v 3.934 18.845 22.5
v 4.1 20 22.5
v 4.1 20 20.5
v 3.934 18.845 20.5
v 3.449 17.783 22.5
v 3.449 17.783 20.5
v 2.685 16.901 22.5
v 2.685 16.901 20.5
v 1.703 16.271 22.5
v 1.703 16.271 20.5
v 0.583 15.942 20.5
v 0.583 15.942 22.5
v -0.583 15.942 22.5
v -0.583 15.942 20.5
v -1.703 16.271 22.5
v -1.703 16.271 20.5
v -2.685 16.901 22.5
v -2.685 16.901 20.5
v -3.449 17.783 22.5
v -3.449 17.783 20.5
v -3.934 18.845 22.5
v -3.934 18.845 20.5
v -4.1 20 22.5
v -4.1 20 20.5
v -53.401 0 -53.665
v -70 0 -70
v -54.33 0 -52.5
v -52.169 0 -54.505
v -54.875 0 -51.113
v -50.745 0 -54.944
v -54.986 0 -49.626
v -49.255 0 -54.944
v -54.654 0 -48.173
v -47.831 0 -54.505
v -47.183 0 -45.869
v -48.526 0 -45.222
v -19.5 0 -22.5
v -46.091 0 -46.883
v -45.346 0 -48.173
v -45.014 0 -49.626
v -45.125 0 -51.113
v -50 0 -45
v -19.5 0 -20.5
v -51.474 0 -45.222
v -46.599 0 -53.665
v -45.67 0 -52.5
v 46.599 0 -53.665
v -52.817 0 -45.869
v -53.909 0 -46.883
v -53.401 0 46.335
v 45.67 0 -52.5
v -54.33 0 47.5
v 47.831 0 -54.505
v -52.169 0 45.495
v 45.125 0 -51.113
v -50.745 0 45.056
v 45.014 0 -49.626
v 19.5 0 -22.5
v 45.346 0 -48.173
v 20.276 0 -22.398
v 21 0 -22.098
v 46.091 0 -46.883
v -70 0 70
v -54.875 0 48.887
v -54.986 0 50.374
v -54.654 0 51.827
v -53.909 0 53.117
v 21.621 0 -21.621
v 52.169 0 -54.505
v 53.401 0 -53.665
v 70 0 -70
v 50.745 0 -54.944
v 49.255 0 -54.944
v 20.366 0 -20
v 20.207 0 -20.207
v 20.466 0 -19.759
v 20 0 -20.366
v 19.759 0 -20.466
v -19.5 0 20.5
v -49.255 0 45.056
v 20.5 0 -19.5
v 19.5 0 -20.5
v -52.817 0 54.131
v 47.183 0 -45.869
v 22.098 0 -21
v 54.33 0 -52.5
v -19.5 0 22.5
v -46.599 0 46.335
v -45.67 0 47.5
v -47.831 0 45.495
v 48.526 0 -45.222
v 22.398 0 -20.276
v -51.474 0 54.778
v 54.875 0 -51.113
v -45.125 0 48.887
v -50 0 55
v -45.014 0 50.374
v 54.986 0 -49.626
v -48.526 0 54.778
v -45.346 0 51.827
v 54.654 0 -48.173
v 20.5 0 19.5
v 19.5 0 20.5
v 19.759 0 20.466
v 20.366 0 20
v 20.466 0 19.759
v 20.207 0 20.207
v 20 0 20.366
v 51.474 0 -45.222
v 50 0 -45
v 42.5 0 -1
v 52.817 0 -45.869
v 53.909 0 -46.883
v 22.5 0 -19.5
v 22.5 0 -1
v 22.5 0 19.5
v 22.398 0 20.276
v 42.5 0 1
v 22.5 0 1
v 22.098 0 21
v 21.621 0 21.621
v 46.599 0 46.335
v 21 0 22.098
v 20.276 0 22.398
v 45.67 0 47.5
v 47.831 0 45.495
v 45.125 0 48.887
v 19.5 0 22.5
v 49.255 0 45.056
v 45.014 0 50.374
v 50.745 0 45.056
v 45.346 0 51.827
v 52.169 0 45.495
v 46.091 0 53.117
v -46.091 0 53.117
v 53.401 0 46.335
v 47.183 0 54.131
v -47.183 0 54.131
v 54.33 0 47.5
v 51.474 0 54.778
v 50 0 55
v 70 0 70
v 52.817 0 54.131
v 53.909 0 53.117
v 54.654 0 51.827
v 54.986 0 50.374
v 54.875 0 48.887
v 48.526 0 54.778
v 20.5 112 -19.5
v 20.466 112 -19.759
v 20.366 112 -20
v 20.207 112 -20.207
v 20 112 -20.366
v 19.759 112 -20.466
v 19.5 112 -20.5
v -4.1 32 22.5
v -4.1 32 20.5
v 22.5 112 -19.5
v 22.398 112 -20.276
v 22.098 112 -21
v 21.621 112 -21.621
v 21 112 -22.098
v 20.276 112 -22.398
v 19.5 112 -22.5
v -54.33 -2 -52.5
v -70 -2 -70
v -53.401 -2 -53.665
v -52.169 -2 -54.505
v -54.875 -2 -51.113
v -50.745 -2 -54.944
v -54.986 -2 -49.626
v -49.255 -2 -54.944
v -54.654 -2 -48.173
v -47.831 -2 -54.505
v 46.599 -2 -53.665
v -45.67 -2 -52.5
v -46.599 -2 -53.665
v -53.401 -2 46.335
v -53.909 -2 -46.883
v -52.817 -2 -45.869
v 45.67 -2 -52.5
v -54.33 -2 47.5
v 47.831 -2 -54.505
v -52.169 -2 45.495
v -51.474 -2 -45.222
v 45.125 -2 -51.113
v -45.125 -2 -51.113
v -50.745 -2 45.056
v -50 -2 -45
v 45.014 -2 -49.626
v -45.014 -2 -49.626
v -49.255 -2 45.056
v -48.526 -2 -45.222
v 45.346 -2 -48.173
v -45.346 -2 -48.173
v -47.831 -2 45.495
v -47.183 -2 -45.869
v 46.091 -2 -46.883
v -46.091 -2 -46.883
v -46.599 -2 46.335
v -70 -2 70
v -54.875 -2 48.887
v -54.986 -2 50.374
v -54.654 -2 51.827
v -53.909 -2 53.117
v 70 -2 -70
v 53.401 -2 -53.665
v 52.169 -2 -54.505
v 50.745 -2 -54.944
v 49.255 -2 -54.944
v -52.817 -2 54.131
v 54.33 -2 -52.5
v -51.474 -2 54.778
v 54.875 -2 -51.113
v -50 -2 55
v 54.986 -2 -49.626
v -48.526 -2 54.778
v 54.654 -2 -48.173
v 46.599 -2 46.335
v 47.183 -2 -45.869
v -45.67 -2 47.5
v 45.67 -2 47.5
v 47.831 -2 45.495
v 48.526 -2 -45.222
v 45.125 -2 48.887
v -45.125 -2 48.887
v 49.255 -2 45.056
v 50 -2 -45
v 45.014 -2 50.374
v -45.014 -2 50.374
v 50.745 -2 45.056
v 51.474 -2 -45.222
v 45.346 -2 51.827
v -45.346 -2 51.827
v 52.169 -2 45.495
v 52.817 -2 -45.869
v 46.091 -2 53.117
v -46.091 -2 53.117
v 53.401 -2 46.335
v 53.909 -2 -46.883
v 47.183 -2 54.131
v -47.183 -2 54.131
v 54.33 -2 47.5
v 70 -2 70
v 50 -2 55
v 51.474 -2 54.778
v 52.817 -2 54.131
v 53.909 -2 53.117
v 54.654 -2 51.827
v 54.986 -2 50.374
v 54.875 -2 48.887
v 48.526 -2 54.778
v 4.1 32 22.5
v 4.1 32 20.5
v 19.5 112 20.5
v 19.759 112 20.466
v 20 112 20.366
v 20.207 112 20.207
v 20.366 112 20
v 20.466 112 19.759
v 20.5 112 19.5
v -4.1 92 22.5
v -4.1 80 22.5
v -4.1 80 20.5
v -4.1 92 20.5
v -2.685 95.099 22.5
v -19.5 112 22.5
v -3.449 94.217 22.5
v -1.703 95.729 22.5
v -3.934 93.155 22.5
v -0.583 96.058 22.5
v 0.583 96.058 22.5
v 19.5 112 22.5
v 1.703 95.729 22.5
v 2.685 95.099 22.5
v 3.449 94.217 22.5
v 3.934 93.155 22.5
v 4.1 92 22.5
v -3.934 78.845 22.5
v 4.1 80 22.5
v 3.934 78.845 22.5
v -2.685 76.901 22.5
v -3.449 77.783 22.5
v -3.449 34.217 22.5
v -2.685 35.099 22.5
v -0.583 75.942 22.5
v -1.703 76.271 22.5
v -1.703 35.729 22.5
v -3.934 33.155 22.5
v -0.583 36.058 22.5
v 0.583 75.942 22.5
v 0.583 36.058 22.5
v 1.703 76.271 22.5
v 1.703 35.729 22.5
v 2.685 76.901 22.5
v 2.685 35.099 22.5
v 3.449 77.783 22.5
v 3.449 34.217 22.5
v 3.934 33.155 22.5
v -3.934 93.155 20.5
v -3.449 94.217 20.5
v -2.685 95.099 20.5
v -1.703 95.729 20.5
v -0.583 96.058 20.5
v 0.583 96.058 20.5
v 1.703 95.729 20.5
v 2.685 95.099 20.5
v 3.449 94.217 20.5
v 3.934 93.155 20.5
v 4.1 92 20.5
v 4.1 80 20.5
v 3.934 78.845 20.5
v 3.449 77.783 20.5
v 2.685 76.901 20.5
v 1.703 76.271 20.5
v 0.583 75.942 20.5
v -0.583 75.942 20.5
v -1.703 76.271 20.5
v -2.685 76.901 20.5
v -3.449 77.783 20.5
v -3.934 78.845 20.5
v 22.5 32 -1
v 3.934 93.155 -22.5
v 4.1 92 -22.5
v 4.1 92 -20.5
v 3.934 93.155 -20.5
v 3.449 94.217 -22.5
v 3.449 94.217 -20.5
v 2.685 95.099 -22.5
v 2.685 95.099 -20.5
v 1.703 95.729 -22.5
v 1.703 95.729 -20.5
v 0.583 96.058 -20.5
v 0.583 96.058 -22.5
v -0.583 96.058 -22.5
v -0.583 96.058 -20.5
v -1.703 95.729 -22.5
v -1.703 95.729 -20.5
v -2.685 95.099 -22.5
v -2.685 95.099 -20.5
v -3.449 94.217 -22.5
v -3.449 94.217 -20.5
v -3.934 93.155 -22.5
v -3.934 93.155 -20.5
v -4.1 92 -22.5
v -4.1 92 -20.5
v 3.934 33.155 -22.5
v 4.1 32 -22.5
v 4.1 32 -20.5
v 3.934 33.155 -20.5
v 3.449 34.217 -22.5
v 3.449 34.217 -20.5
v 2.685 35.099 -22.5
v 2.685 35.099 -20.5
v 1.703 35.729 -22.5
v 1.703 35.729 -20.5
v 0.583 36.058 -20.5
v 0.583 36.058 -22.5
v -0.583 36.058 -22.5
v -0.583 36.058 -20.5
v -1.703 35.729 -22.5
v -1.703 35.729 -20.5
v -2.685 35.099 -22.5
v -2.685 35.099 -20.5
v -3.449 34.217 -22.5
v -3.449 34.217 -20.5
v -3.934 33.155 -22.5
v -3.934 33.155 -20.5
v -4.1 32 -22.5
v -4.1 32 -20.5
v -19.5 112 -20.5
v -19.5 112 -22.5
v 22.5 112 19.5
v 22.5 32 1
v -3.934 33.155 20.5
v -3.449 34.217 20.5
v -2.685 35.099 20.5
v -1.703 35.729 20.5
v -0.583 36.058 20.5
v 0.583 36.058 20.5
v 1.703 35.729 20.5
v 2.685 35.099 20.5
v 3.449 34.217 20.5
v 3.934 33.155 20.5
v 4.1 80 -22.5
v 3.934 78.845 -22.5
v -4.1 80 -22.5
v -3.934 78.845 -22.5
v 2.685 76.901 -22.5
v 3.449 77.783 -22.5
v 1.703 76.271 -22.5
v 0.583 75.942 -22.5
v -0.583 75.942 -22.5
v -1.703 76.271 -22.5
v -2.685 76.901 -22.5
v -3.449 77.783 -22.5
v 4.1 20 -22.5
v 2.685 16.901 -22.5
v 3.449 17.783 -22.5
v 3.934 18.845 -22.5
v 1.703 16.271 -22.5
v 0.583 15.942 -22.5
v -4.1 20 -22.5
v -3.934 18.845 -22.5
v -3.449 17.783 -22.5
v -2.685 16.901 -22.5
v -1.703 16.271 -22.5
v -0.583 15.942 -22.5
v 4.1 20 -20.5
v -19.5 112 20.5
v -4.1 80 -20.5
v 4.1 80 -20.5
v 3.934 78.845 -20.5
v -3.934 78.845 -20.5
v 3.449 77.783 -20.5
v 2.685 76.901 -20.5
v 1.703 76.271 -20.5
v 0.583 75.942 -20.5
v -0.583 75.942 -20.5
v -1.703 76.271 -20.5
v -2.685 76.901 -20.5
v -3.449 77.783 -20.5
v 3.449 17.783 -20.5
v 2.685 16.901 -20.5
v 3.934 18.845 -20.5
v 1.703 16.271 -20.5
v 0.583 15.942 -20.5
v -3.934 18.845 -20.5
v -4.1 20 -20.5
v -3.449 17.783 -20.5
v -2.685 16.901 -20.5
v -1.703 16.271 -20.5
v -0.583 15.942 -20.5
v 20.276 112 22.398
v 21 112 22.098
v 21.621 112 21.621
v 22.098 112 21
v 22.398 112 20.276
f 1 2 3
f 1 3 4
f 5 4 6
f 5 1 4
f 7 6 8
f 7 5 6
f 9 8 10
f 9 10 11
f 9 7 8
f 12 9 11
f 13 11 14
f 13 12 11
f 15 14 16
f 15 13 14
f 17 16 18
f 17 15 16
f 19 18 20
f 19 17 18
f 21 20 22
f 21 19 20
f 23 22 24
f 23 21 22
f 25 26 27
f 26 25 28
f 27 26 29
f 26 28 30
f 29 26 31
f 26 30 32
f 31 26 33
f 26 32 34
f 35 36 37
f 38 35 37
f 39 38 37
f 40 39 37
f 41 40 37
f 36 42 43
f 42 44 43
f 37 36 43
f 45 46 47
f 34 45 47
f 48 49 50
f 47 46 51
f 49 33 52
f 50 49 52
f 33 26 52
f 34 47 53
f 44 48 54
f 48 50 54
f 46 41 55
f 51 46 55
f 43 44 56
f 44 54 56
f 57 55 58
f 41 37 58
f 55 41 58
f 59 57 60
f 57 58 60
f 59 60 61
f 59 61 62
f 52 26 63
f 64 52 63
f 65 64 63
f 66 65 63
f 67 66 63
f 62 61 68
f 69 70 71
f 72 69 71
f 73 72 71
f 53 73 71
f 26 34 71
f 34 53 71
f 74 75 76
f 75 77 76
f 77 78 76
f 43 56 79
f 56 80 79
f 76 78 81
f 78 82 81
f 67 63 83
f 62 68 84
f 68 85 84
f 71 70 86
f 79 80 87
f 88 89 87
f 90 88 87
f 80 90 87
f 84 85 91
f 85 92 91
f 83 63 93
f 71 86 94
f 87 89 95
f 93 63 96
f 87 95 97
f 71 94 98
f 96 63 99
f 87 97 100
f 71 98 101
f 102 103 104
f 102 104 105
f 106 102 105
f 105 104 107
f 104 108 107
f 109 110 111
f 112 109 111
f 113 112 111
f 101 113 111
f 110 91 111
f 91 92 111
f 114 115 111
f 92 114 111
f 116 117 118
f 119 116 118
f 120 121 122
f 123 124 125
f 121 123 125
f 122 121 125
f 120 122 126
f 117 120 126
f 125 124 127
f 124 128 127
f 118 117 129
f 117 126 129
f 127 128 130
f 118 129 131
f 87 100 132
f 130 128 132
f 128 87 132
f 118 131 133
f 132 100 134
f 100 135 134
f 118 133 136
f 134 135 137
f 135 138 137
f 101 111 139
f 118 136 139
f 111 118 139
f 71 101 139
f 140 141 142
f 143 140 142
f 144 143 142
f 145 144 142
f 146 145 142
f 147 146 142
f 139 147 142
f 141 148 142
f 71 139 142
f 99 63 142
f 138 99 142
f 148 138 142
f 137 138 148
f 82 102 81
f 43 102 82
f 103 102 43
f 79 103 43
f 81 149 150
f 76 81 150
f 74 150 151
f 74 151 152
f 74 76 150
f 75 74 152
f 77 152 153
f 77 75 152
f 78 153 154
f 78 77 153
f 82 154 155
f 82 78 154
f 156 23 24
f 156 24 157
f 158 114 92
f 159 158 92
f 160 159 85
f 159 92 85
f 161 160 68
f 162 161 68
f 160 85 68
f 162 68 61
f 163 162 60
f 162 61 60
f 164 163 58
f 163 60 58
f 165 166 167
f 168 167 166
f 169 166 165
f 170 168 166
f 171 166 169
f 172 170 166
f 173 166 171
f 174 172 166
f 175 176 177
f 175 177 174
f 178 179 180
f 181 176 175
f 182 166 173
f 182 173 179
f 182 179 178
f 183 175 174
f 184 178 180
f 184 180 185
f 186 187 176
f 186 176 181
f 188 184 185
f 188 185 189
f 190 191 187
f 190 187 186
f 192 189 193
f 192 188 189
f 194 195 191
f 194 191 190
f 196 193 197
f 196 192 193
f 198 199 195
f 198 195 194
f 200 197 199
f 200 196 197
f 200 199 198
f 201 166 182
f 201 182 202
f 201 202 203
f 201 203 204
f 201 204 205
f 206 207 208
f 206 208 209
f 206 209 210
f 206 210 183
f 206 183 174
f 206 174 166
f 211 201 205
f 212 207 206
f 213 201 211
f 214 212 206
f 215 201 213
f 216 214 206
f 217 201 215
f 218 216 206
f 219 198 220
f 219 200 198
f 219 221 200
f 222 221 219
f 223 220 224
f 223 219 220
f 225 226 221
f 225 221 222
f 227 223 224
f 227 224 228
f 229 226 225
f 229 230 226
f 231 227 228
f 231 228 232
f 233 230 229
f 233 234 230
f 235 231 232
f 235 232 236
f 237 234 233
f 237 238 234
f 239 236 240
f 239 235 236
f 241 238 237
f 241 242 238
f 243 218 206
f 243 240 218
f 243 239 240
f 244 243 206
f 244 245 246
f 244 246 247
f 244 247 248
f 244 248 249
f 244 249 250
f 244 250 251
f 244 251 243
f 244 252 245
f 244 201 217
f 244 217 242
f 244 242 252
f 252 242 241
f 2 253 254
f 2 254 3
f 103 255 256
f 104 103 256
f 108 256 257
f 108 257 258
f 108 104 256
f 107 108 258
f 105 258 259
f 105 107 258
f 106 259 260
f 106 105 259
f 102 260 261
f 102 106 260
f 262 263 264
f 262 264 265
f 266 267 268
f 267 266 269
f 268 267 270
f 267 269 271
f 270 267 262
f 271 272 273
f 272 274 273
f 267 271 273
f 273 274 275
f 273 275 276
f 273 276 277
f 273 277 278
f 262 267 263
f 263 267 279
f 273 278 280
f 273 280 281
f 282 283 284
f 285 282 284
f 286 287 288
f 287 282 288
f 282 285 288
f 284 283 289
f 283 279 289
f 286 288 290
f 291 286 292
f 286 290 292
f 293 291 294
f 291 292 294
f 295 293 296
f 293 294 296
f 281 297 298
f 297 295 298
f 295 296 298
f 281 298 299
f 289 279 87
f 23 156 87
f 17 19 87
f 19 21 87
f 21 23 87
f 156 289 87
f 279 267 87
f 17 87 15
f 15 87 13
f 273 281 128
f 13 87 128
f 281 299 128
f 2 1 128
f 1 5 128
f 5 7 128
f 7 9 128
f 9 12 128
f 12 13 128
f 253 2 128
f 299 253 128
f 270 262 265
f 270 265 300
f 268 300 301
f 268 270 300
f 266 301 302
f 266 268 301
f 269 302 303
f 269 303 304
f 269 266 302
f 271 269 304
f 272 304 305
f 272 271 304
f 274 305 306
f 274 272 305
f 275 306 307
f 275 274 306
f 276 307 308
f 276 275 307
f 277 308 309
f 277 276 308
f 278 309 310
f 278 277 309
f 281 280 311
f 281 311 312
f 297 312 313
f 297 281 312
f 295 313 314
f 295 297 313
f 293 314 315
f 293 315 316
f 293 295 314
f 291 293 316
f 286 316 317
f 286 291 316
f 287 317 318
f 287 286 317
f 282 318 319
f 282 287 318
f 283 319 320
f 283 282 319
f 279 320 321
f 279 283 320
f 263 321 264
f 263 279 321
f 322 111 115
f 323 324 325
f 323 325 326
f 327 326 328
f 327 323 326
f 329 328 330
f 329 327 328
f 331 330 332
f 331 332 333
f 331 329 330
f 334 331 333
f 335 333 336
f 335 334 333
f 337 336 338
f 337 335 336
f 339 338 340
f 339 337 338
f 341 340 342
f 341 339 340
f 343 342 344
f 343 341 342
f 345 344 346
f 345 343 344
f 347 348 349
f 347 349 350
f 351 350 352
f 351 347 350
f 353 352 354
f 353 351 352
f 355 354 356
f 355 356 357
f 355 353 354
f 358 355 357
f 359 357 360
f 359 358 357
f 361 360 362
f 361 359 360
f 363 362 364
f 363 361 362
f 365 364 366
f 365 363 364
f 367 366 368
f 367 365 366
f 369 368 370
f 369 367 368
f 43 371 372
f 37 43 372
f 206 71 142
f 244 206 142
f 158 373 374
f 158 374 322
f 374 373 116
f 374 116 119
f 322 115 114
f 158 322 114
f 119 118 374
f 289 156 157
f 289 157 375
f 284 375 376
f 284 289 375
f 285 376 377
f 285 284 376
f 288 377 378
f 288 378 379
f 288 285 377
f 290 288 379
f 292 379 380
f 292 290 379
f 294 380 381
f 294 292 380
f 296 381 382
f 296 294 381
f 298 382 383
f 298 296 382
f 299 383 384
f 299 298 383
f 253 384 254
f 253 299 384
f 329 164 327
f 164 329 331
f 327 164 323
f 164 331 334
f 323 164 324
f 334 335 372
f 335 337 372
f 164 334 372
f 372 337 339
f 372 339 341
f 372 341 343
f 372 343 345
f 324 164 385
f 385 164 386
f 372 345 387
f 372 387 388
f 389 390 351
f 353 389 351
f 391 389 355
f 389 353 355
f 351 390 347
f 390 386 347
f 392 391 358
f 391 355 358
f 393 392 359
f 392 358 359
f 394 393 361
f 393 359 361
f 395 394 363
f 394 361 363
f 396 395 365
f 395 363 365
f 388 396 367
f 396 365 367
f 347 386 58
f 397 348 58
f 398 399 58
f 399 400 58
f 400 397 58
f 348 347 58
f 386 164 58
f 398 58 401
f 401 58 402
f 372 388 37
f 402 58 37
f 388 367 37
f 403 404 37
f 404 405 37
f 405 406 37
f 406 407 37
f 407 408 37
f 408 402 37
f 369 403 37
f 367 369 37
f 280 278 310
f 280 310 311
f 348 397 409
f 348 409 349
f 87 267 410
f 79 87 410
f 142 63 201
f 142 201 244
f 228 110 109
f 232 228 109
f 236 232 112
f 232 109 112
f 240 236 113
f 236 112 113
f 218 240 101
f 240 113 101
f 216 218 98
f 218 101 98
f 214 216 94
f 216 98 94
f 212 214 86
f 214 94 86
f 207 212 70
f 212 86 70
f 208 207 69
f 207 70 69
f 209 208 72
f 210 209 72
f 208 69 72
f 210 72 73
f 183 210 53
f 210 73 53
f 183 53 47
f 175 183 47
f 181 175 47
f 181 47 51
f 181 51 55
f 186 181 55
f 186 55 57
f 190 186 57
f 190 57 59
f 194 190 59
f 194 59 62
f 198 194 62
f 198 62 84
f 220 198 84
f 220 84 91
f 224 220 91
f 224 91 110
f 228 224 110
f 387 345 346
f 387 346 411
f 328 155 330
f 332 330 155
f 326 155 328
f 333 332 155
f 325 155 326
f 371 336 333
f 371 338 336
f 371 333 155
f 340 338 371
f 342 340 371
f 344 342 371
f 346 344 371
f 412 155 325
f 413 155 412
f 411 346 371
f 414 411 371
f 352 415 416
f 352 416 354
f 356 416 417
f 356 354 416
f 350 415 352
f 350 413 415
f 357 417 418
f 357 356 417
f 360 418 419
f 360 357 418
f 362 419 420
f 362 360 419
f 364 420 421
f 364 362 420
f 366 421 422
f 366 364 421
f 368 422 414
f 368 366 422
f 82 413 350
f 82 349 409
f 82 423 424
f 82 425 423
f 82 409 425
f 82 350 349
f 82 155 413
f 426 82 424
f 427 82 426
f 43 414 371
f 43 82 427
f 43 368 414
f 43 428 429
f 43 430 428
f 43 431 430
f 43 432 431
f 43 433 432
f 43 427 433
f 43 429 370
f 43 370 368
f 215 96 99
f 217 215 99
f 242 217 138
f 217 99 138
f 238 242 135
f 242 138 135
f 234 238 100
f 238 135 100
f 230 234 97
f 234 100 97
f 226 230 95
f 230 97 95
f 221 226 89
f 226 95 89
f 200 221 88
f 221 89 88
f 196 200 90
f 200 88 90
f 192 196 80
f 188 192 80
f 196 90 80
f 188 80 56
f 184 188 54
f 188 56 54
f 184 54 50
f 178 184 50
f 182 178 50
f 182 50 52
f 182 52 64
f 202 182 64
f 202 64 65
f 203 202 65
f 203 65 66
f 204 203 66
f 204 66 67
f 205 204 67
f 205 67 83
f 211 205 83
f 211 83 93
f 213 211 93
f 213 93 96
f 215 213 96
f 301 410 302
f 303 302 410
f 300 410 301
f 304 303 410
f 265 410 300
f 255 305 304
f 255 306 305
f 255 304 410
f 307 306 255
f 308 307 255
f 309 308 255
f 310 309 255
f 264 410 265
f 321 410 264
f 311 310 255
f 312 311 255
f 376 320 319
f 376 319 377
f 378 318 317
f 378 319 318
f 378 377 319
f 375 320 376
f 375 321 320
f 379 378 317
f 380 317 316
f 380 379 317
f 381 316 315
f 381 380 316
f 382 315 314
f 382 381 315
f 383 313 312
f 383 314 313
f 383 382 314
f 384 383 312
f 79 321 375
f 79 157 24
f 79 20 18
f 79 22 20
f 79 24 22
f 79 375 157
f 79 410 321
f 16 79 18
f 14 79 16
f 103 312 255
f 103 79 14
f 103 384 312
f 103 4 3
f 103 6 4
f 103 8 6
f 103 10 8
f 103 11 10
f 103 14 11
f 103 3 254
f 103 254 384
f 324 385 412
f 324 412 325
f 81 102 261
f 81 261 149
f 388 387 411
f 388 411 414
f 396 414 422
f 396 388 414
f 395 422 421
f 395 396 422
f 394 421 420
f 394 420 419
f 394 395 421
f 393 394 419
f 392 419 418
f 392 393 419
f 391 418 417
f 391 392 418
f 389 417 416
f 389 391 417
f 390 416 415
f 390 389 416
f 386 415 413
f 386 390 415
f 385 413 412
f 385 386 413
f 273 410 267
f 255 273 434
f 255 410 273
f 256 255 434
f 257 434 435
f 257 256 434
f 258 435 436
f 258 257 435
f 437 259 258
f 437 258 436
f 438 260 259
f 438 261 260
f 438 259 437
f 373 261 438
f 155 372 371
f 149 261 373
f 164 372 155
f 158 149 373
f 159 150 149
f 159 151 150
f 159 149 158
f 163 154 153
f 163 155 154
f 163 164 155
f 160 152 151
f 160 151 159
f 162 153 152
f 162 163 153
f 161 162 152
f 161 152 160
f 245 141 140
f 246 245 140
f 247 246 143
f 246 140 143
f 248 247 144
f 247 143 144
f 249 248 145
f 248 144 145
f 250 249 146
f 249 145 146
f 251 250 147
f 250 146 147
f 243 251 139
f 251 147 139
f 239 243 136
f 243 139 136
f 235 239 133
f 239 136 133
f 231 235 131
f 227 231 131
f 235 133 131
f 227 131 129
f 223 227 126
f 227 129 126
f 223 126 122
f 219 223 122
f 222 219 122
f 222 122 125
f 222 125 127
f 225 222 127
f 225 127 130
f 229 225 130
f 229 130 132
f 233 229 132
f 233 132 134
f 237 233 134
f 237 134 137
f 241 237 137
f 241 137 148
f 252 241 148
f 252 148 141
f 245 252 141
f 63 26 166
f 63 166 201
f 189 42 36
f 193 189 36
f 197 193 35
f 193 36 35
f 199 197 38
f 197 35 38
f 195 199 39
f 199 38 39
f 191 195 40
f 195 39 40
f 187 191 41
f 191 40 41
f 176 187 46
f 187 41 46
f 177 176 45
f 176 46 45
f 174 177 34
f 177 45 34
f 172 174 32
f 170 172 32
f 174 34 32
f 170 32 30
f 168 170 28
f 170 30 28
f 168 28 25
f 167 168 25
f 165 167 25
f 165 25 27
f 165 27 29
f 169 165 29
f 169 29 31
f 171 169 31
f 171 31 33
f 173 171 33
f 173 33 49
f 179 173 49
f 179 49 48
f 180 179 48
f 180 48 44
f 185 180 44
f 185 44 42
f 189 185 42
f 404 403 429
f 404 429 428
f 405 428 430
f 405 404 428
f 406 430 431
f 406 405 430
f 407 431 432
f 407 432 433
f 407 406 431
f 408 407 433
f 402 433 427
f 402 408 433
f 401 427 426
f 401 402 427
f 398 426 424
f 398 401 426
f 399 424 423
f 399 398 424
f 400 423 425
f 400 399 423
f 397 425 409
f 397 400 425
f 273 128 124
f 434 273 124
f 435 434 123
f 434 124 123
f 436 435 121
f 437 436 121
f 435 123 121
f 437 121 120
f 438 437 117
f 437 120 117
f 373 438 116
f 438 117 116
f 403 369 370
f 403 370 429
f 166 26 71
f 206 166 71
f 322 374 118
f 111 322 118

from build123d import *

# Parameters (mm, degrees)
EXTRUDE_1_DEPTH          = 112
SKETCH_3_W               = 140
SKETCH_3_H               = 140
EXTRUDE_2_DEPTH          = 2
EXTRUDE_3_DEPTH          = 1
CUT_EXTRUDE_1_DEPTH      = 2
PATTERN_CIRCULAR_2_COUNT = 4
SKETCH_7_R               = 5
CUT_EXTRUDE_2_DEPTH      = 150.479095528
SKETCH_8_W               = 10.222107434
SKETCH_8_H               = 48.162502517
CUT_EXTRUDE_3_DEPTH      = 112


with BuildPart() as part:
    # 草图1 → 凸台-拉伸1 (new body)
    with BuildSketch(Plane(origin=(0, 0, 0), x_dir=(1, 0, 0), z_dir=(0, 1, 0))):
        with BuildLine():
            Line((-19.5, -22.5), (19.5, -22.5))
            ThreePointArc((19.5, -22.5), (21.621320344, -21.621320344), (22.5, -19.5))
            Line((22.5, -19.5), (22.5, 19.5))
            ThreePointArc((22.5, 19.5), (21.621320344, 21.621320344), (19.5, 22.5))
            Line((19.5, 22.5), (-19.5, 22.5))
            ThreePointArc((-19.5, 22.5), (-21.621320344, 21.621320344), (-22.5, 19.5))
            Line((-22.5, 19.5), (-22.5, -19.5))
            ThreePointArc((-22.5, -19.5), (-21.621320344, -21.621320344), (-19.5, -22.5))
        make_face()
        with BuildLine():
            Line((-19.5, -20.5), (19.5, -20.5))
            ThreePointArc((19.5, -20.5), (20.207106781, -20.207106781), (20.5, -19.5))
            Line((20.5, -19.5), (20.5, 19.5))
            ThreePointArc((20.5, 19.5), (20.207106781, 20.207106781), (19.5, 20.5))
            Line((19.5, 20.5), (-19.5, 20.5))
            ThreePointArc((-19.5, 20.5), (-20.207106781, 20.207106781), (-20.5, 19.5))
            Line((-20.5, 19.5), (-20.5, -19.5))
            ThreePointArc((-20.5, -19.5), (-20.207106781, -20.207106781), (-19.5, -20.5))
        make_face(mode=Mode.SUBTRACT)
    extrude(amount=EXTRUDE_1_DEPTH)

    # 草图3 → 凸台-拉伸2 (add)
    with BuildSketch(Plane.XZ):
        Rectangle(SKETCH_3_W, SKETCH_3_H)
    extrude(amount=EXTRUDE_2_DEPTH)

    # 草图4 → 凸台-拉伸3 (add, symmetric)
    with BuildSketch(Plane.XY):
        Polygon((22.5, 32), (42.5, 0), (22.5, 0), align=None)
    extrude(amount=EXTRUDE_3_DEPTH, both=True)

    # 草图6 → 切除-拉伸1 (cut)
    with BuildSketch(Plane.XY.offset(22.5)):
        with BuildLine():
            Line((-4.1, 80), (-4.1, 92))
            ThreePointArc((-4.1, 92), (0, 96.1), (4.1, 92))
            Line((4.1, 92), (4.1, 80))
            ThreePointArc((4.1, 80), (0, 75.9), (-4.1, 80))
        make_face()
        with BuildLine():
            Line((-4.1, 20), (-4.1, 32))
            ThreePointArc((-4.1, 32), (0, 36.1), (4.1, 32))
            Line((4.1, 32), (4.1, 20))
            ThreePointArc((4.1, 20), (0, 15.9), (-4.1, 20))
        make_face()
    cut_extrude_1 = extrude(amount=-CUT_EXTRUDE_1_DEPTH, mode=Mode.SUBTRACT)

    # 阵列(圆周)2: 切除-拉伸1 ×4 about axis, 1 skipped
    pattern_circular_2_axis = Axis((0, 0, 0), (0, 1, 0))
    add([cut_extrude_1.rotate(pattern_circular_2_axis, i * 360 / PATTERN_CIRCULAR_2_COUNT) for i in range(1, PATTERN_CIRCULAR_2_COUNT) if i not in (1,)], mode=Mode.SUBTRACT)

    # 草图7 → 切除-拉伸2 (cut, through all)
    with BuildSketch(Plane(origin=(0, 0, 0), x_dir=(1, 0, 0), z_dir=(0, 1, 0))):
        with Locations(Location((50, 50, 0), (0, 0, 270))):
            Circle(SKETCH_7_R)
        with Locations(Location((50, -50, 0), (0, 0, 270))):
            Circle(SKETCH_7_R)
        with Locations(Location((-50, -50, 0), (0, 0, 270))):
            Circle(SKETCH_7_R)
        with Locations(Location((-50, 50, 0), (0, 0, 270))):
            Circle(SKETCH_7_R)
    extrude(amount=-CUT_EXTRUDE_2_DEPTH, mode=Mode.SUBTRACT)

    # 草图8 → 切除-拉伸3 (cut)
    with BuildSketch(Plane(origin=(0, 112, 0), x_dir=(1, 0, 0), z_dir=(0, 1, 0))):
        with Locations((-24.611053717, 1.581251259)):
            Rectangle(SKETCH_8_W, SKETCH_8_H)
    extrude(amount=-CUT_EXTRUDE_3_DEPTH, mode=Mode.SUBTRACT)


solid = part.part
